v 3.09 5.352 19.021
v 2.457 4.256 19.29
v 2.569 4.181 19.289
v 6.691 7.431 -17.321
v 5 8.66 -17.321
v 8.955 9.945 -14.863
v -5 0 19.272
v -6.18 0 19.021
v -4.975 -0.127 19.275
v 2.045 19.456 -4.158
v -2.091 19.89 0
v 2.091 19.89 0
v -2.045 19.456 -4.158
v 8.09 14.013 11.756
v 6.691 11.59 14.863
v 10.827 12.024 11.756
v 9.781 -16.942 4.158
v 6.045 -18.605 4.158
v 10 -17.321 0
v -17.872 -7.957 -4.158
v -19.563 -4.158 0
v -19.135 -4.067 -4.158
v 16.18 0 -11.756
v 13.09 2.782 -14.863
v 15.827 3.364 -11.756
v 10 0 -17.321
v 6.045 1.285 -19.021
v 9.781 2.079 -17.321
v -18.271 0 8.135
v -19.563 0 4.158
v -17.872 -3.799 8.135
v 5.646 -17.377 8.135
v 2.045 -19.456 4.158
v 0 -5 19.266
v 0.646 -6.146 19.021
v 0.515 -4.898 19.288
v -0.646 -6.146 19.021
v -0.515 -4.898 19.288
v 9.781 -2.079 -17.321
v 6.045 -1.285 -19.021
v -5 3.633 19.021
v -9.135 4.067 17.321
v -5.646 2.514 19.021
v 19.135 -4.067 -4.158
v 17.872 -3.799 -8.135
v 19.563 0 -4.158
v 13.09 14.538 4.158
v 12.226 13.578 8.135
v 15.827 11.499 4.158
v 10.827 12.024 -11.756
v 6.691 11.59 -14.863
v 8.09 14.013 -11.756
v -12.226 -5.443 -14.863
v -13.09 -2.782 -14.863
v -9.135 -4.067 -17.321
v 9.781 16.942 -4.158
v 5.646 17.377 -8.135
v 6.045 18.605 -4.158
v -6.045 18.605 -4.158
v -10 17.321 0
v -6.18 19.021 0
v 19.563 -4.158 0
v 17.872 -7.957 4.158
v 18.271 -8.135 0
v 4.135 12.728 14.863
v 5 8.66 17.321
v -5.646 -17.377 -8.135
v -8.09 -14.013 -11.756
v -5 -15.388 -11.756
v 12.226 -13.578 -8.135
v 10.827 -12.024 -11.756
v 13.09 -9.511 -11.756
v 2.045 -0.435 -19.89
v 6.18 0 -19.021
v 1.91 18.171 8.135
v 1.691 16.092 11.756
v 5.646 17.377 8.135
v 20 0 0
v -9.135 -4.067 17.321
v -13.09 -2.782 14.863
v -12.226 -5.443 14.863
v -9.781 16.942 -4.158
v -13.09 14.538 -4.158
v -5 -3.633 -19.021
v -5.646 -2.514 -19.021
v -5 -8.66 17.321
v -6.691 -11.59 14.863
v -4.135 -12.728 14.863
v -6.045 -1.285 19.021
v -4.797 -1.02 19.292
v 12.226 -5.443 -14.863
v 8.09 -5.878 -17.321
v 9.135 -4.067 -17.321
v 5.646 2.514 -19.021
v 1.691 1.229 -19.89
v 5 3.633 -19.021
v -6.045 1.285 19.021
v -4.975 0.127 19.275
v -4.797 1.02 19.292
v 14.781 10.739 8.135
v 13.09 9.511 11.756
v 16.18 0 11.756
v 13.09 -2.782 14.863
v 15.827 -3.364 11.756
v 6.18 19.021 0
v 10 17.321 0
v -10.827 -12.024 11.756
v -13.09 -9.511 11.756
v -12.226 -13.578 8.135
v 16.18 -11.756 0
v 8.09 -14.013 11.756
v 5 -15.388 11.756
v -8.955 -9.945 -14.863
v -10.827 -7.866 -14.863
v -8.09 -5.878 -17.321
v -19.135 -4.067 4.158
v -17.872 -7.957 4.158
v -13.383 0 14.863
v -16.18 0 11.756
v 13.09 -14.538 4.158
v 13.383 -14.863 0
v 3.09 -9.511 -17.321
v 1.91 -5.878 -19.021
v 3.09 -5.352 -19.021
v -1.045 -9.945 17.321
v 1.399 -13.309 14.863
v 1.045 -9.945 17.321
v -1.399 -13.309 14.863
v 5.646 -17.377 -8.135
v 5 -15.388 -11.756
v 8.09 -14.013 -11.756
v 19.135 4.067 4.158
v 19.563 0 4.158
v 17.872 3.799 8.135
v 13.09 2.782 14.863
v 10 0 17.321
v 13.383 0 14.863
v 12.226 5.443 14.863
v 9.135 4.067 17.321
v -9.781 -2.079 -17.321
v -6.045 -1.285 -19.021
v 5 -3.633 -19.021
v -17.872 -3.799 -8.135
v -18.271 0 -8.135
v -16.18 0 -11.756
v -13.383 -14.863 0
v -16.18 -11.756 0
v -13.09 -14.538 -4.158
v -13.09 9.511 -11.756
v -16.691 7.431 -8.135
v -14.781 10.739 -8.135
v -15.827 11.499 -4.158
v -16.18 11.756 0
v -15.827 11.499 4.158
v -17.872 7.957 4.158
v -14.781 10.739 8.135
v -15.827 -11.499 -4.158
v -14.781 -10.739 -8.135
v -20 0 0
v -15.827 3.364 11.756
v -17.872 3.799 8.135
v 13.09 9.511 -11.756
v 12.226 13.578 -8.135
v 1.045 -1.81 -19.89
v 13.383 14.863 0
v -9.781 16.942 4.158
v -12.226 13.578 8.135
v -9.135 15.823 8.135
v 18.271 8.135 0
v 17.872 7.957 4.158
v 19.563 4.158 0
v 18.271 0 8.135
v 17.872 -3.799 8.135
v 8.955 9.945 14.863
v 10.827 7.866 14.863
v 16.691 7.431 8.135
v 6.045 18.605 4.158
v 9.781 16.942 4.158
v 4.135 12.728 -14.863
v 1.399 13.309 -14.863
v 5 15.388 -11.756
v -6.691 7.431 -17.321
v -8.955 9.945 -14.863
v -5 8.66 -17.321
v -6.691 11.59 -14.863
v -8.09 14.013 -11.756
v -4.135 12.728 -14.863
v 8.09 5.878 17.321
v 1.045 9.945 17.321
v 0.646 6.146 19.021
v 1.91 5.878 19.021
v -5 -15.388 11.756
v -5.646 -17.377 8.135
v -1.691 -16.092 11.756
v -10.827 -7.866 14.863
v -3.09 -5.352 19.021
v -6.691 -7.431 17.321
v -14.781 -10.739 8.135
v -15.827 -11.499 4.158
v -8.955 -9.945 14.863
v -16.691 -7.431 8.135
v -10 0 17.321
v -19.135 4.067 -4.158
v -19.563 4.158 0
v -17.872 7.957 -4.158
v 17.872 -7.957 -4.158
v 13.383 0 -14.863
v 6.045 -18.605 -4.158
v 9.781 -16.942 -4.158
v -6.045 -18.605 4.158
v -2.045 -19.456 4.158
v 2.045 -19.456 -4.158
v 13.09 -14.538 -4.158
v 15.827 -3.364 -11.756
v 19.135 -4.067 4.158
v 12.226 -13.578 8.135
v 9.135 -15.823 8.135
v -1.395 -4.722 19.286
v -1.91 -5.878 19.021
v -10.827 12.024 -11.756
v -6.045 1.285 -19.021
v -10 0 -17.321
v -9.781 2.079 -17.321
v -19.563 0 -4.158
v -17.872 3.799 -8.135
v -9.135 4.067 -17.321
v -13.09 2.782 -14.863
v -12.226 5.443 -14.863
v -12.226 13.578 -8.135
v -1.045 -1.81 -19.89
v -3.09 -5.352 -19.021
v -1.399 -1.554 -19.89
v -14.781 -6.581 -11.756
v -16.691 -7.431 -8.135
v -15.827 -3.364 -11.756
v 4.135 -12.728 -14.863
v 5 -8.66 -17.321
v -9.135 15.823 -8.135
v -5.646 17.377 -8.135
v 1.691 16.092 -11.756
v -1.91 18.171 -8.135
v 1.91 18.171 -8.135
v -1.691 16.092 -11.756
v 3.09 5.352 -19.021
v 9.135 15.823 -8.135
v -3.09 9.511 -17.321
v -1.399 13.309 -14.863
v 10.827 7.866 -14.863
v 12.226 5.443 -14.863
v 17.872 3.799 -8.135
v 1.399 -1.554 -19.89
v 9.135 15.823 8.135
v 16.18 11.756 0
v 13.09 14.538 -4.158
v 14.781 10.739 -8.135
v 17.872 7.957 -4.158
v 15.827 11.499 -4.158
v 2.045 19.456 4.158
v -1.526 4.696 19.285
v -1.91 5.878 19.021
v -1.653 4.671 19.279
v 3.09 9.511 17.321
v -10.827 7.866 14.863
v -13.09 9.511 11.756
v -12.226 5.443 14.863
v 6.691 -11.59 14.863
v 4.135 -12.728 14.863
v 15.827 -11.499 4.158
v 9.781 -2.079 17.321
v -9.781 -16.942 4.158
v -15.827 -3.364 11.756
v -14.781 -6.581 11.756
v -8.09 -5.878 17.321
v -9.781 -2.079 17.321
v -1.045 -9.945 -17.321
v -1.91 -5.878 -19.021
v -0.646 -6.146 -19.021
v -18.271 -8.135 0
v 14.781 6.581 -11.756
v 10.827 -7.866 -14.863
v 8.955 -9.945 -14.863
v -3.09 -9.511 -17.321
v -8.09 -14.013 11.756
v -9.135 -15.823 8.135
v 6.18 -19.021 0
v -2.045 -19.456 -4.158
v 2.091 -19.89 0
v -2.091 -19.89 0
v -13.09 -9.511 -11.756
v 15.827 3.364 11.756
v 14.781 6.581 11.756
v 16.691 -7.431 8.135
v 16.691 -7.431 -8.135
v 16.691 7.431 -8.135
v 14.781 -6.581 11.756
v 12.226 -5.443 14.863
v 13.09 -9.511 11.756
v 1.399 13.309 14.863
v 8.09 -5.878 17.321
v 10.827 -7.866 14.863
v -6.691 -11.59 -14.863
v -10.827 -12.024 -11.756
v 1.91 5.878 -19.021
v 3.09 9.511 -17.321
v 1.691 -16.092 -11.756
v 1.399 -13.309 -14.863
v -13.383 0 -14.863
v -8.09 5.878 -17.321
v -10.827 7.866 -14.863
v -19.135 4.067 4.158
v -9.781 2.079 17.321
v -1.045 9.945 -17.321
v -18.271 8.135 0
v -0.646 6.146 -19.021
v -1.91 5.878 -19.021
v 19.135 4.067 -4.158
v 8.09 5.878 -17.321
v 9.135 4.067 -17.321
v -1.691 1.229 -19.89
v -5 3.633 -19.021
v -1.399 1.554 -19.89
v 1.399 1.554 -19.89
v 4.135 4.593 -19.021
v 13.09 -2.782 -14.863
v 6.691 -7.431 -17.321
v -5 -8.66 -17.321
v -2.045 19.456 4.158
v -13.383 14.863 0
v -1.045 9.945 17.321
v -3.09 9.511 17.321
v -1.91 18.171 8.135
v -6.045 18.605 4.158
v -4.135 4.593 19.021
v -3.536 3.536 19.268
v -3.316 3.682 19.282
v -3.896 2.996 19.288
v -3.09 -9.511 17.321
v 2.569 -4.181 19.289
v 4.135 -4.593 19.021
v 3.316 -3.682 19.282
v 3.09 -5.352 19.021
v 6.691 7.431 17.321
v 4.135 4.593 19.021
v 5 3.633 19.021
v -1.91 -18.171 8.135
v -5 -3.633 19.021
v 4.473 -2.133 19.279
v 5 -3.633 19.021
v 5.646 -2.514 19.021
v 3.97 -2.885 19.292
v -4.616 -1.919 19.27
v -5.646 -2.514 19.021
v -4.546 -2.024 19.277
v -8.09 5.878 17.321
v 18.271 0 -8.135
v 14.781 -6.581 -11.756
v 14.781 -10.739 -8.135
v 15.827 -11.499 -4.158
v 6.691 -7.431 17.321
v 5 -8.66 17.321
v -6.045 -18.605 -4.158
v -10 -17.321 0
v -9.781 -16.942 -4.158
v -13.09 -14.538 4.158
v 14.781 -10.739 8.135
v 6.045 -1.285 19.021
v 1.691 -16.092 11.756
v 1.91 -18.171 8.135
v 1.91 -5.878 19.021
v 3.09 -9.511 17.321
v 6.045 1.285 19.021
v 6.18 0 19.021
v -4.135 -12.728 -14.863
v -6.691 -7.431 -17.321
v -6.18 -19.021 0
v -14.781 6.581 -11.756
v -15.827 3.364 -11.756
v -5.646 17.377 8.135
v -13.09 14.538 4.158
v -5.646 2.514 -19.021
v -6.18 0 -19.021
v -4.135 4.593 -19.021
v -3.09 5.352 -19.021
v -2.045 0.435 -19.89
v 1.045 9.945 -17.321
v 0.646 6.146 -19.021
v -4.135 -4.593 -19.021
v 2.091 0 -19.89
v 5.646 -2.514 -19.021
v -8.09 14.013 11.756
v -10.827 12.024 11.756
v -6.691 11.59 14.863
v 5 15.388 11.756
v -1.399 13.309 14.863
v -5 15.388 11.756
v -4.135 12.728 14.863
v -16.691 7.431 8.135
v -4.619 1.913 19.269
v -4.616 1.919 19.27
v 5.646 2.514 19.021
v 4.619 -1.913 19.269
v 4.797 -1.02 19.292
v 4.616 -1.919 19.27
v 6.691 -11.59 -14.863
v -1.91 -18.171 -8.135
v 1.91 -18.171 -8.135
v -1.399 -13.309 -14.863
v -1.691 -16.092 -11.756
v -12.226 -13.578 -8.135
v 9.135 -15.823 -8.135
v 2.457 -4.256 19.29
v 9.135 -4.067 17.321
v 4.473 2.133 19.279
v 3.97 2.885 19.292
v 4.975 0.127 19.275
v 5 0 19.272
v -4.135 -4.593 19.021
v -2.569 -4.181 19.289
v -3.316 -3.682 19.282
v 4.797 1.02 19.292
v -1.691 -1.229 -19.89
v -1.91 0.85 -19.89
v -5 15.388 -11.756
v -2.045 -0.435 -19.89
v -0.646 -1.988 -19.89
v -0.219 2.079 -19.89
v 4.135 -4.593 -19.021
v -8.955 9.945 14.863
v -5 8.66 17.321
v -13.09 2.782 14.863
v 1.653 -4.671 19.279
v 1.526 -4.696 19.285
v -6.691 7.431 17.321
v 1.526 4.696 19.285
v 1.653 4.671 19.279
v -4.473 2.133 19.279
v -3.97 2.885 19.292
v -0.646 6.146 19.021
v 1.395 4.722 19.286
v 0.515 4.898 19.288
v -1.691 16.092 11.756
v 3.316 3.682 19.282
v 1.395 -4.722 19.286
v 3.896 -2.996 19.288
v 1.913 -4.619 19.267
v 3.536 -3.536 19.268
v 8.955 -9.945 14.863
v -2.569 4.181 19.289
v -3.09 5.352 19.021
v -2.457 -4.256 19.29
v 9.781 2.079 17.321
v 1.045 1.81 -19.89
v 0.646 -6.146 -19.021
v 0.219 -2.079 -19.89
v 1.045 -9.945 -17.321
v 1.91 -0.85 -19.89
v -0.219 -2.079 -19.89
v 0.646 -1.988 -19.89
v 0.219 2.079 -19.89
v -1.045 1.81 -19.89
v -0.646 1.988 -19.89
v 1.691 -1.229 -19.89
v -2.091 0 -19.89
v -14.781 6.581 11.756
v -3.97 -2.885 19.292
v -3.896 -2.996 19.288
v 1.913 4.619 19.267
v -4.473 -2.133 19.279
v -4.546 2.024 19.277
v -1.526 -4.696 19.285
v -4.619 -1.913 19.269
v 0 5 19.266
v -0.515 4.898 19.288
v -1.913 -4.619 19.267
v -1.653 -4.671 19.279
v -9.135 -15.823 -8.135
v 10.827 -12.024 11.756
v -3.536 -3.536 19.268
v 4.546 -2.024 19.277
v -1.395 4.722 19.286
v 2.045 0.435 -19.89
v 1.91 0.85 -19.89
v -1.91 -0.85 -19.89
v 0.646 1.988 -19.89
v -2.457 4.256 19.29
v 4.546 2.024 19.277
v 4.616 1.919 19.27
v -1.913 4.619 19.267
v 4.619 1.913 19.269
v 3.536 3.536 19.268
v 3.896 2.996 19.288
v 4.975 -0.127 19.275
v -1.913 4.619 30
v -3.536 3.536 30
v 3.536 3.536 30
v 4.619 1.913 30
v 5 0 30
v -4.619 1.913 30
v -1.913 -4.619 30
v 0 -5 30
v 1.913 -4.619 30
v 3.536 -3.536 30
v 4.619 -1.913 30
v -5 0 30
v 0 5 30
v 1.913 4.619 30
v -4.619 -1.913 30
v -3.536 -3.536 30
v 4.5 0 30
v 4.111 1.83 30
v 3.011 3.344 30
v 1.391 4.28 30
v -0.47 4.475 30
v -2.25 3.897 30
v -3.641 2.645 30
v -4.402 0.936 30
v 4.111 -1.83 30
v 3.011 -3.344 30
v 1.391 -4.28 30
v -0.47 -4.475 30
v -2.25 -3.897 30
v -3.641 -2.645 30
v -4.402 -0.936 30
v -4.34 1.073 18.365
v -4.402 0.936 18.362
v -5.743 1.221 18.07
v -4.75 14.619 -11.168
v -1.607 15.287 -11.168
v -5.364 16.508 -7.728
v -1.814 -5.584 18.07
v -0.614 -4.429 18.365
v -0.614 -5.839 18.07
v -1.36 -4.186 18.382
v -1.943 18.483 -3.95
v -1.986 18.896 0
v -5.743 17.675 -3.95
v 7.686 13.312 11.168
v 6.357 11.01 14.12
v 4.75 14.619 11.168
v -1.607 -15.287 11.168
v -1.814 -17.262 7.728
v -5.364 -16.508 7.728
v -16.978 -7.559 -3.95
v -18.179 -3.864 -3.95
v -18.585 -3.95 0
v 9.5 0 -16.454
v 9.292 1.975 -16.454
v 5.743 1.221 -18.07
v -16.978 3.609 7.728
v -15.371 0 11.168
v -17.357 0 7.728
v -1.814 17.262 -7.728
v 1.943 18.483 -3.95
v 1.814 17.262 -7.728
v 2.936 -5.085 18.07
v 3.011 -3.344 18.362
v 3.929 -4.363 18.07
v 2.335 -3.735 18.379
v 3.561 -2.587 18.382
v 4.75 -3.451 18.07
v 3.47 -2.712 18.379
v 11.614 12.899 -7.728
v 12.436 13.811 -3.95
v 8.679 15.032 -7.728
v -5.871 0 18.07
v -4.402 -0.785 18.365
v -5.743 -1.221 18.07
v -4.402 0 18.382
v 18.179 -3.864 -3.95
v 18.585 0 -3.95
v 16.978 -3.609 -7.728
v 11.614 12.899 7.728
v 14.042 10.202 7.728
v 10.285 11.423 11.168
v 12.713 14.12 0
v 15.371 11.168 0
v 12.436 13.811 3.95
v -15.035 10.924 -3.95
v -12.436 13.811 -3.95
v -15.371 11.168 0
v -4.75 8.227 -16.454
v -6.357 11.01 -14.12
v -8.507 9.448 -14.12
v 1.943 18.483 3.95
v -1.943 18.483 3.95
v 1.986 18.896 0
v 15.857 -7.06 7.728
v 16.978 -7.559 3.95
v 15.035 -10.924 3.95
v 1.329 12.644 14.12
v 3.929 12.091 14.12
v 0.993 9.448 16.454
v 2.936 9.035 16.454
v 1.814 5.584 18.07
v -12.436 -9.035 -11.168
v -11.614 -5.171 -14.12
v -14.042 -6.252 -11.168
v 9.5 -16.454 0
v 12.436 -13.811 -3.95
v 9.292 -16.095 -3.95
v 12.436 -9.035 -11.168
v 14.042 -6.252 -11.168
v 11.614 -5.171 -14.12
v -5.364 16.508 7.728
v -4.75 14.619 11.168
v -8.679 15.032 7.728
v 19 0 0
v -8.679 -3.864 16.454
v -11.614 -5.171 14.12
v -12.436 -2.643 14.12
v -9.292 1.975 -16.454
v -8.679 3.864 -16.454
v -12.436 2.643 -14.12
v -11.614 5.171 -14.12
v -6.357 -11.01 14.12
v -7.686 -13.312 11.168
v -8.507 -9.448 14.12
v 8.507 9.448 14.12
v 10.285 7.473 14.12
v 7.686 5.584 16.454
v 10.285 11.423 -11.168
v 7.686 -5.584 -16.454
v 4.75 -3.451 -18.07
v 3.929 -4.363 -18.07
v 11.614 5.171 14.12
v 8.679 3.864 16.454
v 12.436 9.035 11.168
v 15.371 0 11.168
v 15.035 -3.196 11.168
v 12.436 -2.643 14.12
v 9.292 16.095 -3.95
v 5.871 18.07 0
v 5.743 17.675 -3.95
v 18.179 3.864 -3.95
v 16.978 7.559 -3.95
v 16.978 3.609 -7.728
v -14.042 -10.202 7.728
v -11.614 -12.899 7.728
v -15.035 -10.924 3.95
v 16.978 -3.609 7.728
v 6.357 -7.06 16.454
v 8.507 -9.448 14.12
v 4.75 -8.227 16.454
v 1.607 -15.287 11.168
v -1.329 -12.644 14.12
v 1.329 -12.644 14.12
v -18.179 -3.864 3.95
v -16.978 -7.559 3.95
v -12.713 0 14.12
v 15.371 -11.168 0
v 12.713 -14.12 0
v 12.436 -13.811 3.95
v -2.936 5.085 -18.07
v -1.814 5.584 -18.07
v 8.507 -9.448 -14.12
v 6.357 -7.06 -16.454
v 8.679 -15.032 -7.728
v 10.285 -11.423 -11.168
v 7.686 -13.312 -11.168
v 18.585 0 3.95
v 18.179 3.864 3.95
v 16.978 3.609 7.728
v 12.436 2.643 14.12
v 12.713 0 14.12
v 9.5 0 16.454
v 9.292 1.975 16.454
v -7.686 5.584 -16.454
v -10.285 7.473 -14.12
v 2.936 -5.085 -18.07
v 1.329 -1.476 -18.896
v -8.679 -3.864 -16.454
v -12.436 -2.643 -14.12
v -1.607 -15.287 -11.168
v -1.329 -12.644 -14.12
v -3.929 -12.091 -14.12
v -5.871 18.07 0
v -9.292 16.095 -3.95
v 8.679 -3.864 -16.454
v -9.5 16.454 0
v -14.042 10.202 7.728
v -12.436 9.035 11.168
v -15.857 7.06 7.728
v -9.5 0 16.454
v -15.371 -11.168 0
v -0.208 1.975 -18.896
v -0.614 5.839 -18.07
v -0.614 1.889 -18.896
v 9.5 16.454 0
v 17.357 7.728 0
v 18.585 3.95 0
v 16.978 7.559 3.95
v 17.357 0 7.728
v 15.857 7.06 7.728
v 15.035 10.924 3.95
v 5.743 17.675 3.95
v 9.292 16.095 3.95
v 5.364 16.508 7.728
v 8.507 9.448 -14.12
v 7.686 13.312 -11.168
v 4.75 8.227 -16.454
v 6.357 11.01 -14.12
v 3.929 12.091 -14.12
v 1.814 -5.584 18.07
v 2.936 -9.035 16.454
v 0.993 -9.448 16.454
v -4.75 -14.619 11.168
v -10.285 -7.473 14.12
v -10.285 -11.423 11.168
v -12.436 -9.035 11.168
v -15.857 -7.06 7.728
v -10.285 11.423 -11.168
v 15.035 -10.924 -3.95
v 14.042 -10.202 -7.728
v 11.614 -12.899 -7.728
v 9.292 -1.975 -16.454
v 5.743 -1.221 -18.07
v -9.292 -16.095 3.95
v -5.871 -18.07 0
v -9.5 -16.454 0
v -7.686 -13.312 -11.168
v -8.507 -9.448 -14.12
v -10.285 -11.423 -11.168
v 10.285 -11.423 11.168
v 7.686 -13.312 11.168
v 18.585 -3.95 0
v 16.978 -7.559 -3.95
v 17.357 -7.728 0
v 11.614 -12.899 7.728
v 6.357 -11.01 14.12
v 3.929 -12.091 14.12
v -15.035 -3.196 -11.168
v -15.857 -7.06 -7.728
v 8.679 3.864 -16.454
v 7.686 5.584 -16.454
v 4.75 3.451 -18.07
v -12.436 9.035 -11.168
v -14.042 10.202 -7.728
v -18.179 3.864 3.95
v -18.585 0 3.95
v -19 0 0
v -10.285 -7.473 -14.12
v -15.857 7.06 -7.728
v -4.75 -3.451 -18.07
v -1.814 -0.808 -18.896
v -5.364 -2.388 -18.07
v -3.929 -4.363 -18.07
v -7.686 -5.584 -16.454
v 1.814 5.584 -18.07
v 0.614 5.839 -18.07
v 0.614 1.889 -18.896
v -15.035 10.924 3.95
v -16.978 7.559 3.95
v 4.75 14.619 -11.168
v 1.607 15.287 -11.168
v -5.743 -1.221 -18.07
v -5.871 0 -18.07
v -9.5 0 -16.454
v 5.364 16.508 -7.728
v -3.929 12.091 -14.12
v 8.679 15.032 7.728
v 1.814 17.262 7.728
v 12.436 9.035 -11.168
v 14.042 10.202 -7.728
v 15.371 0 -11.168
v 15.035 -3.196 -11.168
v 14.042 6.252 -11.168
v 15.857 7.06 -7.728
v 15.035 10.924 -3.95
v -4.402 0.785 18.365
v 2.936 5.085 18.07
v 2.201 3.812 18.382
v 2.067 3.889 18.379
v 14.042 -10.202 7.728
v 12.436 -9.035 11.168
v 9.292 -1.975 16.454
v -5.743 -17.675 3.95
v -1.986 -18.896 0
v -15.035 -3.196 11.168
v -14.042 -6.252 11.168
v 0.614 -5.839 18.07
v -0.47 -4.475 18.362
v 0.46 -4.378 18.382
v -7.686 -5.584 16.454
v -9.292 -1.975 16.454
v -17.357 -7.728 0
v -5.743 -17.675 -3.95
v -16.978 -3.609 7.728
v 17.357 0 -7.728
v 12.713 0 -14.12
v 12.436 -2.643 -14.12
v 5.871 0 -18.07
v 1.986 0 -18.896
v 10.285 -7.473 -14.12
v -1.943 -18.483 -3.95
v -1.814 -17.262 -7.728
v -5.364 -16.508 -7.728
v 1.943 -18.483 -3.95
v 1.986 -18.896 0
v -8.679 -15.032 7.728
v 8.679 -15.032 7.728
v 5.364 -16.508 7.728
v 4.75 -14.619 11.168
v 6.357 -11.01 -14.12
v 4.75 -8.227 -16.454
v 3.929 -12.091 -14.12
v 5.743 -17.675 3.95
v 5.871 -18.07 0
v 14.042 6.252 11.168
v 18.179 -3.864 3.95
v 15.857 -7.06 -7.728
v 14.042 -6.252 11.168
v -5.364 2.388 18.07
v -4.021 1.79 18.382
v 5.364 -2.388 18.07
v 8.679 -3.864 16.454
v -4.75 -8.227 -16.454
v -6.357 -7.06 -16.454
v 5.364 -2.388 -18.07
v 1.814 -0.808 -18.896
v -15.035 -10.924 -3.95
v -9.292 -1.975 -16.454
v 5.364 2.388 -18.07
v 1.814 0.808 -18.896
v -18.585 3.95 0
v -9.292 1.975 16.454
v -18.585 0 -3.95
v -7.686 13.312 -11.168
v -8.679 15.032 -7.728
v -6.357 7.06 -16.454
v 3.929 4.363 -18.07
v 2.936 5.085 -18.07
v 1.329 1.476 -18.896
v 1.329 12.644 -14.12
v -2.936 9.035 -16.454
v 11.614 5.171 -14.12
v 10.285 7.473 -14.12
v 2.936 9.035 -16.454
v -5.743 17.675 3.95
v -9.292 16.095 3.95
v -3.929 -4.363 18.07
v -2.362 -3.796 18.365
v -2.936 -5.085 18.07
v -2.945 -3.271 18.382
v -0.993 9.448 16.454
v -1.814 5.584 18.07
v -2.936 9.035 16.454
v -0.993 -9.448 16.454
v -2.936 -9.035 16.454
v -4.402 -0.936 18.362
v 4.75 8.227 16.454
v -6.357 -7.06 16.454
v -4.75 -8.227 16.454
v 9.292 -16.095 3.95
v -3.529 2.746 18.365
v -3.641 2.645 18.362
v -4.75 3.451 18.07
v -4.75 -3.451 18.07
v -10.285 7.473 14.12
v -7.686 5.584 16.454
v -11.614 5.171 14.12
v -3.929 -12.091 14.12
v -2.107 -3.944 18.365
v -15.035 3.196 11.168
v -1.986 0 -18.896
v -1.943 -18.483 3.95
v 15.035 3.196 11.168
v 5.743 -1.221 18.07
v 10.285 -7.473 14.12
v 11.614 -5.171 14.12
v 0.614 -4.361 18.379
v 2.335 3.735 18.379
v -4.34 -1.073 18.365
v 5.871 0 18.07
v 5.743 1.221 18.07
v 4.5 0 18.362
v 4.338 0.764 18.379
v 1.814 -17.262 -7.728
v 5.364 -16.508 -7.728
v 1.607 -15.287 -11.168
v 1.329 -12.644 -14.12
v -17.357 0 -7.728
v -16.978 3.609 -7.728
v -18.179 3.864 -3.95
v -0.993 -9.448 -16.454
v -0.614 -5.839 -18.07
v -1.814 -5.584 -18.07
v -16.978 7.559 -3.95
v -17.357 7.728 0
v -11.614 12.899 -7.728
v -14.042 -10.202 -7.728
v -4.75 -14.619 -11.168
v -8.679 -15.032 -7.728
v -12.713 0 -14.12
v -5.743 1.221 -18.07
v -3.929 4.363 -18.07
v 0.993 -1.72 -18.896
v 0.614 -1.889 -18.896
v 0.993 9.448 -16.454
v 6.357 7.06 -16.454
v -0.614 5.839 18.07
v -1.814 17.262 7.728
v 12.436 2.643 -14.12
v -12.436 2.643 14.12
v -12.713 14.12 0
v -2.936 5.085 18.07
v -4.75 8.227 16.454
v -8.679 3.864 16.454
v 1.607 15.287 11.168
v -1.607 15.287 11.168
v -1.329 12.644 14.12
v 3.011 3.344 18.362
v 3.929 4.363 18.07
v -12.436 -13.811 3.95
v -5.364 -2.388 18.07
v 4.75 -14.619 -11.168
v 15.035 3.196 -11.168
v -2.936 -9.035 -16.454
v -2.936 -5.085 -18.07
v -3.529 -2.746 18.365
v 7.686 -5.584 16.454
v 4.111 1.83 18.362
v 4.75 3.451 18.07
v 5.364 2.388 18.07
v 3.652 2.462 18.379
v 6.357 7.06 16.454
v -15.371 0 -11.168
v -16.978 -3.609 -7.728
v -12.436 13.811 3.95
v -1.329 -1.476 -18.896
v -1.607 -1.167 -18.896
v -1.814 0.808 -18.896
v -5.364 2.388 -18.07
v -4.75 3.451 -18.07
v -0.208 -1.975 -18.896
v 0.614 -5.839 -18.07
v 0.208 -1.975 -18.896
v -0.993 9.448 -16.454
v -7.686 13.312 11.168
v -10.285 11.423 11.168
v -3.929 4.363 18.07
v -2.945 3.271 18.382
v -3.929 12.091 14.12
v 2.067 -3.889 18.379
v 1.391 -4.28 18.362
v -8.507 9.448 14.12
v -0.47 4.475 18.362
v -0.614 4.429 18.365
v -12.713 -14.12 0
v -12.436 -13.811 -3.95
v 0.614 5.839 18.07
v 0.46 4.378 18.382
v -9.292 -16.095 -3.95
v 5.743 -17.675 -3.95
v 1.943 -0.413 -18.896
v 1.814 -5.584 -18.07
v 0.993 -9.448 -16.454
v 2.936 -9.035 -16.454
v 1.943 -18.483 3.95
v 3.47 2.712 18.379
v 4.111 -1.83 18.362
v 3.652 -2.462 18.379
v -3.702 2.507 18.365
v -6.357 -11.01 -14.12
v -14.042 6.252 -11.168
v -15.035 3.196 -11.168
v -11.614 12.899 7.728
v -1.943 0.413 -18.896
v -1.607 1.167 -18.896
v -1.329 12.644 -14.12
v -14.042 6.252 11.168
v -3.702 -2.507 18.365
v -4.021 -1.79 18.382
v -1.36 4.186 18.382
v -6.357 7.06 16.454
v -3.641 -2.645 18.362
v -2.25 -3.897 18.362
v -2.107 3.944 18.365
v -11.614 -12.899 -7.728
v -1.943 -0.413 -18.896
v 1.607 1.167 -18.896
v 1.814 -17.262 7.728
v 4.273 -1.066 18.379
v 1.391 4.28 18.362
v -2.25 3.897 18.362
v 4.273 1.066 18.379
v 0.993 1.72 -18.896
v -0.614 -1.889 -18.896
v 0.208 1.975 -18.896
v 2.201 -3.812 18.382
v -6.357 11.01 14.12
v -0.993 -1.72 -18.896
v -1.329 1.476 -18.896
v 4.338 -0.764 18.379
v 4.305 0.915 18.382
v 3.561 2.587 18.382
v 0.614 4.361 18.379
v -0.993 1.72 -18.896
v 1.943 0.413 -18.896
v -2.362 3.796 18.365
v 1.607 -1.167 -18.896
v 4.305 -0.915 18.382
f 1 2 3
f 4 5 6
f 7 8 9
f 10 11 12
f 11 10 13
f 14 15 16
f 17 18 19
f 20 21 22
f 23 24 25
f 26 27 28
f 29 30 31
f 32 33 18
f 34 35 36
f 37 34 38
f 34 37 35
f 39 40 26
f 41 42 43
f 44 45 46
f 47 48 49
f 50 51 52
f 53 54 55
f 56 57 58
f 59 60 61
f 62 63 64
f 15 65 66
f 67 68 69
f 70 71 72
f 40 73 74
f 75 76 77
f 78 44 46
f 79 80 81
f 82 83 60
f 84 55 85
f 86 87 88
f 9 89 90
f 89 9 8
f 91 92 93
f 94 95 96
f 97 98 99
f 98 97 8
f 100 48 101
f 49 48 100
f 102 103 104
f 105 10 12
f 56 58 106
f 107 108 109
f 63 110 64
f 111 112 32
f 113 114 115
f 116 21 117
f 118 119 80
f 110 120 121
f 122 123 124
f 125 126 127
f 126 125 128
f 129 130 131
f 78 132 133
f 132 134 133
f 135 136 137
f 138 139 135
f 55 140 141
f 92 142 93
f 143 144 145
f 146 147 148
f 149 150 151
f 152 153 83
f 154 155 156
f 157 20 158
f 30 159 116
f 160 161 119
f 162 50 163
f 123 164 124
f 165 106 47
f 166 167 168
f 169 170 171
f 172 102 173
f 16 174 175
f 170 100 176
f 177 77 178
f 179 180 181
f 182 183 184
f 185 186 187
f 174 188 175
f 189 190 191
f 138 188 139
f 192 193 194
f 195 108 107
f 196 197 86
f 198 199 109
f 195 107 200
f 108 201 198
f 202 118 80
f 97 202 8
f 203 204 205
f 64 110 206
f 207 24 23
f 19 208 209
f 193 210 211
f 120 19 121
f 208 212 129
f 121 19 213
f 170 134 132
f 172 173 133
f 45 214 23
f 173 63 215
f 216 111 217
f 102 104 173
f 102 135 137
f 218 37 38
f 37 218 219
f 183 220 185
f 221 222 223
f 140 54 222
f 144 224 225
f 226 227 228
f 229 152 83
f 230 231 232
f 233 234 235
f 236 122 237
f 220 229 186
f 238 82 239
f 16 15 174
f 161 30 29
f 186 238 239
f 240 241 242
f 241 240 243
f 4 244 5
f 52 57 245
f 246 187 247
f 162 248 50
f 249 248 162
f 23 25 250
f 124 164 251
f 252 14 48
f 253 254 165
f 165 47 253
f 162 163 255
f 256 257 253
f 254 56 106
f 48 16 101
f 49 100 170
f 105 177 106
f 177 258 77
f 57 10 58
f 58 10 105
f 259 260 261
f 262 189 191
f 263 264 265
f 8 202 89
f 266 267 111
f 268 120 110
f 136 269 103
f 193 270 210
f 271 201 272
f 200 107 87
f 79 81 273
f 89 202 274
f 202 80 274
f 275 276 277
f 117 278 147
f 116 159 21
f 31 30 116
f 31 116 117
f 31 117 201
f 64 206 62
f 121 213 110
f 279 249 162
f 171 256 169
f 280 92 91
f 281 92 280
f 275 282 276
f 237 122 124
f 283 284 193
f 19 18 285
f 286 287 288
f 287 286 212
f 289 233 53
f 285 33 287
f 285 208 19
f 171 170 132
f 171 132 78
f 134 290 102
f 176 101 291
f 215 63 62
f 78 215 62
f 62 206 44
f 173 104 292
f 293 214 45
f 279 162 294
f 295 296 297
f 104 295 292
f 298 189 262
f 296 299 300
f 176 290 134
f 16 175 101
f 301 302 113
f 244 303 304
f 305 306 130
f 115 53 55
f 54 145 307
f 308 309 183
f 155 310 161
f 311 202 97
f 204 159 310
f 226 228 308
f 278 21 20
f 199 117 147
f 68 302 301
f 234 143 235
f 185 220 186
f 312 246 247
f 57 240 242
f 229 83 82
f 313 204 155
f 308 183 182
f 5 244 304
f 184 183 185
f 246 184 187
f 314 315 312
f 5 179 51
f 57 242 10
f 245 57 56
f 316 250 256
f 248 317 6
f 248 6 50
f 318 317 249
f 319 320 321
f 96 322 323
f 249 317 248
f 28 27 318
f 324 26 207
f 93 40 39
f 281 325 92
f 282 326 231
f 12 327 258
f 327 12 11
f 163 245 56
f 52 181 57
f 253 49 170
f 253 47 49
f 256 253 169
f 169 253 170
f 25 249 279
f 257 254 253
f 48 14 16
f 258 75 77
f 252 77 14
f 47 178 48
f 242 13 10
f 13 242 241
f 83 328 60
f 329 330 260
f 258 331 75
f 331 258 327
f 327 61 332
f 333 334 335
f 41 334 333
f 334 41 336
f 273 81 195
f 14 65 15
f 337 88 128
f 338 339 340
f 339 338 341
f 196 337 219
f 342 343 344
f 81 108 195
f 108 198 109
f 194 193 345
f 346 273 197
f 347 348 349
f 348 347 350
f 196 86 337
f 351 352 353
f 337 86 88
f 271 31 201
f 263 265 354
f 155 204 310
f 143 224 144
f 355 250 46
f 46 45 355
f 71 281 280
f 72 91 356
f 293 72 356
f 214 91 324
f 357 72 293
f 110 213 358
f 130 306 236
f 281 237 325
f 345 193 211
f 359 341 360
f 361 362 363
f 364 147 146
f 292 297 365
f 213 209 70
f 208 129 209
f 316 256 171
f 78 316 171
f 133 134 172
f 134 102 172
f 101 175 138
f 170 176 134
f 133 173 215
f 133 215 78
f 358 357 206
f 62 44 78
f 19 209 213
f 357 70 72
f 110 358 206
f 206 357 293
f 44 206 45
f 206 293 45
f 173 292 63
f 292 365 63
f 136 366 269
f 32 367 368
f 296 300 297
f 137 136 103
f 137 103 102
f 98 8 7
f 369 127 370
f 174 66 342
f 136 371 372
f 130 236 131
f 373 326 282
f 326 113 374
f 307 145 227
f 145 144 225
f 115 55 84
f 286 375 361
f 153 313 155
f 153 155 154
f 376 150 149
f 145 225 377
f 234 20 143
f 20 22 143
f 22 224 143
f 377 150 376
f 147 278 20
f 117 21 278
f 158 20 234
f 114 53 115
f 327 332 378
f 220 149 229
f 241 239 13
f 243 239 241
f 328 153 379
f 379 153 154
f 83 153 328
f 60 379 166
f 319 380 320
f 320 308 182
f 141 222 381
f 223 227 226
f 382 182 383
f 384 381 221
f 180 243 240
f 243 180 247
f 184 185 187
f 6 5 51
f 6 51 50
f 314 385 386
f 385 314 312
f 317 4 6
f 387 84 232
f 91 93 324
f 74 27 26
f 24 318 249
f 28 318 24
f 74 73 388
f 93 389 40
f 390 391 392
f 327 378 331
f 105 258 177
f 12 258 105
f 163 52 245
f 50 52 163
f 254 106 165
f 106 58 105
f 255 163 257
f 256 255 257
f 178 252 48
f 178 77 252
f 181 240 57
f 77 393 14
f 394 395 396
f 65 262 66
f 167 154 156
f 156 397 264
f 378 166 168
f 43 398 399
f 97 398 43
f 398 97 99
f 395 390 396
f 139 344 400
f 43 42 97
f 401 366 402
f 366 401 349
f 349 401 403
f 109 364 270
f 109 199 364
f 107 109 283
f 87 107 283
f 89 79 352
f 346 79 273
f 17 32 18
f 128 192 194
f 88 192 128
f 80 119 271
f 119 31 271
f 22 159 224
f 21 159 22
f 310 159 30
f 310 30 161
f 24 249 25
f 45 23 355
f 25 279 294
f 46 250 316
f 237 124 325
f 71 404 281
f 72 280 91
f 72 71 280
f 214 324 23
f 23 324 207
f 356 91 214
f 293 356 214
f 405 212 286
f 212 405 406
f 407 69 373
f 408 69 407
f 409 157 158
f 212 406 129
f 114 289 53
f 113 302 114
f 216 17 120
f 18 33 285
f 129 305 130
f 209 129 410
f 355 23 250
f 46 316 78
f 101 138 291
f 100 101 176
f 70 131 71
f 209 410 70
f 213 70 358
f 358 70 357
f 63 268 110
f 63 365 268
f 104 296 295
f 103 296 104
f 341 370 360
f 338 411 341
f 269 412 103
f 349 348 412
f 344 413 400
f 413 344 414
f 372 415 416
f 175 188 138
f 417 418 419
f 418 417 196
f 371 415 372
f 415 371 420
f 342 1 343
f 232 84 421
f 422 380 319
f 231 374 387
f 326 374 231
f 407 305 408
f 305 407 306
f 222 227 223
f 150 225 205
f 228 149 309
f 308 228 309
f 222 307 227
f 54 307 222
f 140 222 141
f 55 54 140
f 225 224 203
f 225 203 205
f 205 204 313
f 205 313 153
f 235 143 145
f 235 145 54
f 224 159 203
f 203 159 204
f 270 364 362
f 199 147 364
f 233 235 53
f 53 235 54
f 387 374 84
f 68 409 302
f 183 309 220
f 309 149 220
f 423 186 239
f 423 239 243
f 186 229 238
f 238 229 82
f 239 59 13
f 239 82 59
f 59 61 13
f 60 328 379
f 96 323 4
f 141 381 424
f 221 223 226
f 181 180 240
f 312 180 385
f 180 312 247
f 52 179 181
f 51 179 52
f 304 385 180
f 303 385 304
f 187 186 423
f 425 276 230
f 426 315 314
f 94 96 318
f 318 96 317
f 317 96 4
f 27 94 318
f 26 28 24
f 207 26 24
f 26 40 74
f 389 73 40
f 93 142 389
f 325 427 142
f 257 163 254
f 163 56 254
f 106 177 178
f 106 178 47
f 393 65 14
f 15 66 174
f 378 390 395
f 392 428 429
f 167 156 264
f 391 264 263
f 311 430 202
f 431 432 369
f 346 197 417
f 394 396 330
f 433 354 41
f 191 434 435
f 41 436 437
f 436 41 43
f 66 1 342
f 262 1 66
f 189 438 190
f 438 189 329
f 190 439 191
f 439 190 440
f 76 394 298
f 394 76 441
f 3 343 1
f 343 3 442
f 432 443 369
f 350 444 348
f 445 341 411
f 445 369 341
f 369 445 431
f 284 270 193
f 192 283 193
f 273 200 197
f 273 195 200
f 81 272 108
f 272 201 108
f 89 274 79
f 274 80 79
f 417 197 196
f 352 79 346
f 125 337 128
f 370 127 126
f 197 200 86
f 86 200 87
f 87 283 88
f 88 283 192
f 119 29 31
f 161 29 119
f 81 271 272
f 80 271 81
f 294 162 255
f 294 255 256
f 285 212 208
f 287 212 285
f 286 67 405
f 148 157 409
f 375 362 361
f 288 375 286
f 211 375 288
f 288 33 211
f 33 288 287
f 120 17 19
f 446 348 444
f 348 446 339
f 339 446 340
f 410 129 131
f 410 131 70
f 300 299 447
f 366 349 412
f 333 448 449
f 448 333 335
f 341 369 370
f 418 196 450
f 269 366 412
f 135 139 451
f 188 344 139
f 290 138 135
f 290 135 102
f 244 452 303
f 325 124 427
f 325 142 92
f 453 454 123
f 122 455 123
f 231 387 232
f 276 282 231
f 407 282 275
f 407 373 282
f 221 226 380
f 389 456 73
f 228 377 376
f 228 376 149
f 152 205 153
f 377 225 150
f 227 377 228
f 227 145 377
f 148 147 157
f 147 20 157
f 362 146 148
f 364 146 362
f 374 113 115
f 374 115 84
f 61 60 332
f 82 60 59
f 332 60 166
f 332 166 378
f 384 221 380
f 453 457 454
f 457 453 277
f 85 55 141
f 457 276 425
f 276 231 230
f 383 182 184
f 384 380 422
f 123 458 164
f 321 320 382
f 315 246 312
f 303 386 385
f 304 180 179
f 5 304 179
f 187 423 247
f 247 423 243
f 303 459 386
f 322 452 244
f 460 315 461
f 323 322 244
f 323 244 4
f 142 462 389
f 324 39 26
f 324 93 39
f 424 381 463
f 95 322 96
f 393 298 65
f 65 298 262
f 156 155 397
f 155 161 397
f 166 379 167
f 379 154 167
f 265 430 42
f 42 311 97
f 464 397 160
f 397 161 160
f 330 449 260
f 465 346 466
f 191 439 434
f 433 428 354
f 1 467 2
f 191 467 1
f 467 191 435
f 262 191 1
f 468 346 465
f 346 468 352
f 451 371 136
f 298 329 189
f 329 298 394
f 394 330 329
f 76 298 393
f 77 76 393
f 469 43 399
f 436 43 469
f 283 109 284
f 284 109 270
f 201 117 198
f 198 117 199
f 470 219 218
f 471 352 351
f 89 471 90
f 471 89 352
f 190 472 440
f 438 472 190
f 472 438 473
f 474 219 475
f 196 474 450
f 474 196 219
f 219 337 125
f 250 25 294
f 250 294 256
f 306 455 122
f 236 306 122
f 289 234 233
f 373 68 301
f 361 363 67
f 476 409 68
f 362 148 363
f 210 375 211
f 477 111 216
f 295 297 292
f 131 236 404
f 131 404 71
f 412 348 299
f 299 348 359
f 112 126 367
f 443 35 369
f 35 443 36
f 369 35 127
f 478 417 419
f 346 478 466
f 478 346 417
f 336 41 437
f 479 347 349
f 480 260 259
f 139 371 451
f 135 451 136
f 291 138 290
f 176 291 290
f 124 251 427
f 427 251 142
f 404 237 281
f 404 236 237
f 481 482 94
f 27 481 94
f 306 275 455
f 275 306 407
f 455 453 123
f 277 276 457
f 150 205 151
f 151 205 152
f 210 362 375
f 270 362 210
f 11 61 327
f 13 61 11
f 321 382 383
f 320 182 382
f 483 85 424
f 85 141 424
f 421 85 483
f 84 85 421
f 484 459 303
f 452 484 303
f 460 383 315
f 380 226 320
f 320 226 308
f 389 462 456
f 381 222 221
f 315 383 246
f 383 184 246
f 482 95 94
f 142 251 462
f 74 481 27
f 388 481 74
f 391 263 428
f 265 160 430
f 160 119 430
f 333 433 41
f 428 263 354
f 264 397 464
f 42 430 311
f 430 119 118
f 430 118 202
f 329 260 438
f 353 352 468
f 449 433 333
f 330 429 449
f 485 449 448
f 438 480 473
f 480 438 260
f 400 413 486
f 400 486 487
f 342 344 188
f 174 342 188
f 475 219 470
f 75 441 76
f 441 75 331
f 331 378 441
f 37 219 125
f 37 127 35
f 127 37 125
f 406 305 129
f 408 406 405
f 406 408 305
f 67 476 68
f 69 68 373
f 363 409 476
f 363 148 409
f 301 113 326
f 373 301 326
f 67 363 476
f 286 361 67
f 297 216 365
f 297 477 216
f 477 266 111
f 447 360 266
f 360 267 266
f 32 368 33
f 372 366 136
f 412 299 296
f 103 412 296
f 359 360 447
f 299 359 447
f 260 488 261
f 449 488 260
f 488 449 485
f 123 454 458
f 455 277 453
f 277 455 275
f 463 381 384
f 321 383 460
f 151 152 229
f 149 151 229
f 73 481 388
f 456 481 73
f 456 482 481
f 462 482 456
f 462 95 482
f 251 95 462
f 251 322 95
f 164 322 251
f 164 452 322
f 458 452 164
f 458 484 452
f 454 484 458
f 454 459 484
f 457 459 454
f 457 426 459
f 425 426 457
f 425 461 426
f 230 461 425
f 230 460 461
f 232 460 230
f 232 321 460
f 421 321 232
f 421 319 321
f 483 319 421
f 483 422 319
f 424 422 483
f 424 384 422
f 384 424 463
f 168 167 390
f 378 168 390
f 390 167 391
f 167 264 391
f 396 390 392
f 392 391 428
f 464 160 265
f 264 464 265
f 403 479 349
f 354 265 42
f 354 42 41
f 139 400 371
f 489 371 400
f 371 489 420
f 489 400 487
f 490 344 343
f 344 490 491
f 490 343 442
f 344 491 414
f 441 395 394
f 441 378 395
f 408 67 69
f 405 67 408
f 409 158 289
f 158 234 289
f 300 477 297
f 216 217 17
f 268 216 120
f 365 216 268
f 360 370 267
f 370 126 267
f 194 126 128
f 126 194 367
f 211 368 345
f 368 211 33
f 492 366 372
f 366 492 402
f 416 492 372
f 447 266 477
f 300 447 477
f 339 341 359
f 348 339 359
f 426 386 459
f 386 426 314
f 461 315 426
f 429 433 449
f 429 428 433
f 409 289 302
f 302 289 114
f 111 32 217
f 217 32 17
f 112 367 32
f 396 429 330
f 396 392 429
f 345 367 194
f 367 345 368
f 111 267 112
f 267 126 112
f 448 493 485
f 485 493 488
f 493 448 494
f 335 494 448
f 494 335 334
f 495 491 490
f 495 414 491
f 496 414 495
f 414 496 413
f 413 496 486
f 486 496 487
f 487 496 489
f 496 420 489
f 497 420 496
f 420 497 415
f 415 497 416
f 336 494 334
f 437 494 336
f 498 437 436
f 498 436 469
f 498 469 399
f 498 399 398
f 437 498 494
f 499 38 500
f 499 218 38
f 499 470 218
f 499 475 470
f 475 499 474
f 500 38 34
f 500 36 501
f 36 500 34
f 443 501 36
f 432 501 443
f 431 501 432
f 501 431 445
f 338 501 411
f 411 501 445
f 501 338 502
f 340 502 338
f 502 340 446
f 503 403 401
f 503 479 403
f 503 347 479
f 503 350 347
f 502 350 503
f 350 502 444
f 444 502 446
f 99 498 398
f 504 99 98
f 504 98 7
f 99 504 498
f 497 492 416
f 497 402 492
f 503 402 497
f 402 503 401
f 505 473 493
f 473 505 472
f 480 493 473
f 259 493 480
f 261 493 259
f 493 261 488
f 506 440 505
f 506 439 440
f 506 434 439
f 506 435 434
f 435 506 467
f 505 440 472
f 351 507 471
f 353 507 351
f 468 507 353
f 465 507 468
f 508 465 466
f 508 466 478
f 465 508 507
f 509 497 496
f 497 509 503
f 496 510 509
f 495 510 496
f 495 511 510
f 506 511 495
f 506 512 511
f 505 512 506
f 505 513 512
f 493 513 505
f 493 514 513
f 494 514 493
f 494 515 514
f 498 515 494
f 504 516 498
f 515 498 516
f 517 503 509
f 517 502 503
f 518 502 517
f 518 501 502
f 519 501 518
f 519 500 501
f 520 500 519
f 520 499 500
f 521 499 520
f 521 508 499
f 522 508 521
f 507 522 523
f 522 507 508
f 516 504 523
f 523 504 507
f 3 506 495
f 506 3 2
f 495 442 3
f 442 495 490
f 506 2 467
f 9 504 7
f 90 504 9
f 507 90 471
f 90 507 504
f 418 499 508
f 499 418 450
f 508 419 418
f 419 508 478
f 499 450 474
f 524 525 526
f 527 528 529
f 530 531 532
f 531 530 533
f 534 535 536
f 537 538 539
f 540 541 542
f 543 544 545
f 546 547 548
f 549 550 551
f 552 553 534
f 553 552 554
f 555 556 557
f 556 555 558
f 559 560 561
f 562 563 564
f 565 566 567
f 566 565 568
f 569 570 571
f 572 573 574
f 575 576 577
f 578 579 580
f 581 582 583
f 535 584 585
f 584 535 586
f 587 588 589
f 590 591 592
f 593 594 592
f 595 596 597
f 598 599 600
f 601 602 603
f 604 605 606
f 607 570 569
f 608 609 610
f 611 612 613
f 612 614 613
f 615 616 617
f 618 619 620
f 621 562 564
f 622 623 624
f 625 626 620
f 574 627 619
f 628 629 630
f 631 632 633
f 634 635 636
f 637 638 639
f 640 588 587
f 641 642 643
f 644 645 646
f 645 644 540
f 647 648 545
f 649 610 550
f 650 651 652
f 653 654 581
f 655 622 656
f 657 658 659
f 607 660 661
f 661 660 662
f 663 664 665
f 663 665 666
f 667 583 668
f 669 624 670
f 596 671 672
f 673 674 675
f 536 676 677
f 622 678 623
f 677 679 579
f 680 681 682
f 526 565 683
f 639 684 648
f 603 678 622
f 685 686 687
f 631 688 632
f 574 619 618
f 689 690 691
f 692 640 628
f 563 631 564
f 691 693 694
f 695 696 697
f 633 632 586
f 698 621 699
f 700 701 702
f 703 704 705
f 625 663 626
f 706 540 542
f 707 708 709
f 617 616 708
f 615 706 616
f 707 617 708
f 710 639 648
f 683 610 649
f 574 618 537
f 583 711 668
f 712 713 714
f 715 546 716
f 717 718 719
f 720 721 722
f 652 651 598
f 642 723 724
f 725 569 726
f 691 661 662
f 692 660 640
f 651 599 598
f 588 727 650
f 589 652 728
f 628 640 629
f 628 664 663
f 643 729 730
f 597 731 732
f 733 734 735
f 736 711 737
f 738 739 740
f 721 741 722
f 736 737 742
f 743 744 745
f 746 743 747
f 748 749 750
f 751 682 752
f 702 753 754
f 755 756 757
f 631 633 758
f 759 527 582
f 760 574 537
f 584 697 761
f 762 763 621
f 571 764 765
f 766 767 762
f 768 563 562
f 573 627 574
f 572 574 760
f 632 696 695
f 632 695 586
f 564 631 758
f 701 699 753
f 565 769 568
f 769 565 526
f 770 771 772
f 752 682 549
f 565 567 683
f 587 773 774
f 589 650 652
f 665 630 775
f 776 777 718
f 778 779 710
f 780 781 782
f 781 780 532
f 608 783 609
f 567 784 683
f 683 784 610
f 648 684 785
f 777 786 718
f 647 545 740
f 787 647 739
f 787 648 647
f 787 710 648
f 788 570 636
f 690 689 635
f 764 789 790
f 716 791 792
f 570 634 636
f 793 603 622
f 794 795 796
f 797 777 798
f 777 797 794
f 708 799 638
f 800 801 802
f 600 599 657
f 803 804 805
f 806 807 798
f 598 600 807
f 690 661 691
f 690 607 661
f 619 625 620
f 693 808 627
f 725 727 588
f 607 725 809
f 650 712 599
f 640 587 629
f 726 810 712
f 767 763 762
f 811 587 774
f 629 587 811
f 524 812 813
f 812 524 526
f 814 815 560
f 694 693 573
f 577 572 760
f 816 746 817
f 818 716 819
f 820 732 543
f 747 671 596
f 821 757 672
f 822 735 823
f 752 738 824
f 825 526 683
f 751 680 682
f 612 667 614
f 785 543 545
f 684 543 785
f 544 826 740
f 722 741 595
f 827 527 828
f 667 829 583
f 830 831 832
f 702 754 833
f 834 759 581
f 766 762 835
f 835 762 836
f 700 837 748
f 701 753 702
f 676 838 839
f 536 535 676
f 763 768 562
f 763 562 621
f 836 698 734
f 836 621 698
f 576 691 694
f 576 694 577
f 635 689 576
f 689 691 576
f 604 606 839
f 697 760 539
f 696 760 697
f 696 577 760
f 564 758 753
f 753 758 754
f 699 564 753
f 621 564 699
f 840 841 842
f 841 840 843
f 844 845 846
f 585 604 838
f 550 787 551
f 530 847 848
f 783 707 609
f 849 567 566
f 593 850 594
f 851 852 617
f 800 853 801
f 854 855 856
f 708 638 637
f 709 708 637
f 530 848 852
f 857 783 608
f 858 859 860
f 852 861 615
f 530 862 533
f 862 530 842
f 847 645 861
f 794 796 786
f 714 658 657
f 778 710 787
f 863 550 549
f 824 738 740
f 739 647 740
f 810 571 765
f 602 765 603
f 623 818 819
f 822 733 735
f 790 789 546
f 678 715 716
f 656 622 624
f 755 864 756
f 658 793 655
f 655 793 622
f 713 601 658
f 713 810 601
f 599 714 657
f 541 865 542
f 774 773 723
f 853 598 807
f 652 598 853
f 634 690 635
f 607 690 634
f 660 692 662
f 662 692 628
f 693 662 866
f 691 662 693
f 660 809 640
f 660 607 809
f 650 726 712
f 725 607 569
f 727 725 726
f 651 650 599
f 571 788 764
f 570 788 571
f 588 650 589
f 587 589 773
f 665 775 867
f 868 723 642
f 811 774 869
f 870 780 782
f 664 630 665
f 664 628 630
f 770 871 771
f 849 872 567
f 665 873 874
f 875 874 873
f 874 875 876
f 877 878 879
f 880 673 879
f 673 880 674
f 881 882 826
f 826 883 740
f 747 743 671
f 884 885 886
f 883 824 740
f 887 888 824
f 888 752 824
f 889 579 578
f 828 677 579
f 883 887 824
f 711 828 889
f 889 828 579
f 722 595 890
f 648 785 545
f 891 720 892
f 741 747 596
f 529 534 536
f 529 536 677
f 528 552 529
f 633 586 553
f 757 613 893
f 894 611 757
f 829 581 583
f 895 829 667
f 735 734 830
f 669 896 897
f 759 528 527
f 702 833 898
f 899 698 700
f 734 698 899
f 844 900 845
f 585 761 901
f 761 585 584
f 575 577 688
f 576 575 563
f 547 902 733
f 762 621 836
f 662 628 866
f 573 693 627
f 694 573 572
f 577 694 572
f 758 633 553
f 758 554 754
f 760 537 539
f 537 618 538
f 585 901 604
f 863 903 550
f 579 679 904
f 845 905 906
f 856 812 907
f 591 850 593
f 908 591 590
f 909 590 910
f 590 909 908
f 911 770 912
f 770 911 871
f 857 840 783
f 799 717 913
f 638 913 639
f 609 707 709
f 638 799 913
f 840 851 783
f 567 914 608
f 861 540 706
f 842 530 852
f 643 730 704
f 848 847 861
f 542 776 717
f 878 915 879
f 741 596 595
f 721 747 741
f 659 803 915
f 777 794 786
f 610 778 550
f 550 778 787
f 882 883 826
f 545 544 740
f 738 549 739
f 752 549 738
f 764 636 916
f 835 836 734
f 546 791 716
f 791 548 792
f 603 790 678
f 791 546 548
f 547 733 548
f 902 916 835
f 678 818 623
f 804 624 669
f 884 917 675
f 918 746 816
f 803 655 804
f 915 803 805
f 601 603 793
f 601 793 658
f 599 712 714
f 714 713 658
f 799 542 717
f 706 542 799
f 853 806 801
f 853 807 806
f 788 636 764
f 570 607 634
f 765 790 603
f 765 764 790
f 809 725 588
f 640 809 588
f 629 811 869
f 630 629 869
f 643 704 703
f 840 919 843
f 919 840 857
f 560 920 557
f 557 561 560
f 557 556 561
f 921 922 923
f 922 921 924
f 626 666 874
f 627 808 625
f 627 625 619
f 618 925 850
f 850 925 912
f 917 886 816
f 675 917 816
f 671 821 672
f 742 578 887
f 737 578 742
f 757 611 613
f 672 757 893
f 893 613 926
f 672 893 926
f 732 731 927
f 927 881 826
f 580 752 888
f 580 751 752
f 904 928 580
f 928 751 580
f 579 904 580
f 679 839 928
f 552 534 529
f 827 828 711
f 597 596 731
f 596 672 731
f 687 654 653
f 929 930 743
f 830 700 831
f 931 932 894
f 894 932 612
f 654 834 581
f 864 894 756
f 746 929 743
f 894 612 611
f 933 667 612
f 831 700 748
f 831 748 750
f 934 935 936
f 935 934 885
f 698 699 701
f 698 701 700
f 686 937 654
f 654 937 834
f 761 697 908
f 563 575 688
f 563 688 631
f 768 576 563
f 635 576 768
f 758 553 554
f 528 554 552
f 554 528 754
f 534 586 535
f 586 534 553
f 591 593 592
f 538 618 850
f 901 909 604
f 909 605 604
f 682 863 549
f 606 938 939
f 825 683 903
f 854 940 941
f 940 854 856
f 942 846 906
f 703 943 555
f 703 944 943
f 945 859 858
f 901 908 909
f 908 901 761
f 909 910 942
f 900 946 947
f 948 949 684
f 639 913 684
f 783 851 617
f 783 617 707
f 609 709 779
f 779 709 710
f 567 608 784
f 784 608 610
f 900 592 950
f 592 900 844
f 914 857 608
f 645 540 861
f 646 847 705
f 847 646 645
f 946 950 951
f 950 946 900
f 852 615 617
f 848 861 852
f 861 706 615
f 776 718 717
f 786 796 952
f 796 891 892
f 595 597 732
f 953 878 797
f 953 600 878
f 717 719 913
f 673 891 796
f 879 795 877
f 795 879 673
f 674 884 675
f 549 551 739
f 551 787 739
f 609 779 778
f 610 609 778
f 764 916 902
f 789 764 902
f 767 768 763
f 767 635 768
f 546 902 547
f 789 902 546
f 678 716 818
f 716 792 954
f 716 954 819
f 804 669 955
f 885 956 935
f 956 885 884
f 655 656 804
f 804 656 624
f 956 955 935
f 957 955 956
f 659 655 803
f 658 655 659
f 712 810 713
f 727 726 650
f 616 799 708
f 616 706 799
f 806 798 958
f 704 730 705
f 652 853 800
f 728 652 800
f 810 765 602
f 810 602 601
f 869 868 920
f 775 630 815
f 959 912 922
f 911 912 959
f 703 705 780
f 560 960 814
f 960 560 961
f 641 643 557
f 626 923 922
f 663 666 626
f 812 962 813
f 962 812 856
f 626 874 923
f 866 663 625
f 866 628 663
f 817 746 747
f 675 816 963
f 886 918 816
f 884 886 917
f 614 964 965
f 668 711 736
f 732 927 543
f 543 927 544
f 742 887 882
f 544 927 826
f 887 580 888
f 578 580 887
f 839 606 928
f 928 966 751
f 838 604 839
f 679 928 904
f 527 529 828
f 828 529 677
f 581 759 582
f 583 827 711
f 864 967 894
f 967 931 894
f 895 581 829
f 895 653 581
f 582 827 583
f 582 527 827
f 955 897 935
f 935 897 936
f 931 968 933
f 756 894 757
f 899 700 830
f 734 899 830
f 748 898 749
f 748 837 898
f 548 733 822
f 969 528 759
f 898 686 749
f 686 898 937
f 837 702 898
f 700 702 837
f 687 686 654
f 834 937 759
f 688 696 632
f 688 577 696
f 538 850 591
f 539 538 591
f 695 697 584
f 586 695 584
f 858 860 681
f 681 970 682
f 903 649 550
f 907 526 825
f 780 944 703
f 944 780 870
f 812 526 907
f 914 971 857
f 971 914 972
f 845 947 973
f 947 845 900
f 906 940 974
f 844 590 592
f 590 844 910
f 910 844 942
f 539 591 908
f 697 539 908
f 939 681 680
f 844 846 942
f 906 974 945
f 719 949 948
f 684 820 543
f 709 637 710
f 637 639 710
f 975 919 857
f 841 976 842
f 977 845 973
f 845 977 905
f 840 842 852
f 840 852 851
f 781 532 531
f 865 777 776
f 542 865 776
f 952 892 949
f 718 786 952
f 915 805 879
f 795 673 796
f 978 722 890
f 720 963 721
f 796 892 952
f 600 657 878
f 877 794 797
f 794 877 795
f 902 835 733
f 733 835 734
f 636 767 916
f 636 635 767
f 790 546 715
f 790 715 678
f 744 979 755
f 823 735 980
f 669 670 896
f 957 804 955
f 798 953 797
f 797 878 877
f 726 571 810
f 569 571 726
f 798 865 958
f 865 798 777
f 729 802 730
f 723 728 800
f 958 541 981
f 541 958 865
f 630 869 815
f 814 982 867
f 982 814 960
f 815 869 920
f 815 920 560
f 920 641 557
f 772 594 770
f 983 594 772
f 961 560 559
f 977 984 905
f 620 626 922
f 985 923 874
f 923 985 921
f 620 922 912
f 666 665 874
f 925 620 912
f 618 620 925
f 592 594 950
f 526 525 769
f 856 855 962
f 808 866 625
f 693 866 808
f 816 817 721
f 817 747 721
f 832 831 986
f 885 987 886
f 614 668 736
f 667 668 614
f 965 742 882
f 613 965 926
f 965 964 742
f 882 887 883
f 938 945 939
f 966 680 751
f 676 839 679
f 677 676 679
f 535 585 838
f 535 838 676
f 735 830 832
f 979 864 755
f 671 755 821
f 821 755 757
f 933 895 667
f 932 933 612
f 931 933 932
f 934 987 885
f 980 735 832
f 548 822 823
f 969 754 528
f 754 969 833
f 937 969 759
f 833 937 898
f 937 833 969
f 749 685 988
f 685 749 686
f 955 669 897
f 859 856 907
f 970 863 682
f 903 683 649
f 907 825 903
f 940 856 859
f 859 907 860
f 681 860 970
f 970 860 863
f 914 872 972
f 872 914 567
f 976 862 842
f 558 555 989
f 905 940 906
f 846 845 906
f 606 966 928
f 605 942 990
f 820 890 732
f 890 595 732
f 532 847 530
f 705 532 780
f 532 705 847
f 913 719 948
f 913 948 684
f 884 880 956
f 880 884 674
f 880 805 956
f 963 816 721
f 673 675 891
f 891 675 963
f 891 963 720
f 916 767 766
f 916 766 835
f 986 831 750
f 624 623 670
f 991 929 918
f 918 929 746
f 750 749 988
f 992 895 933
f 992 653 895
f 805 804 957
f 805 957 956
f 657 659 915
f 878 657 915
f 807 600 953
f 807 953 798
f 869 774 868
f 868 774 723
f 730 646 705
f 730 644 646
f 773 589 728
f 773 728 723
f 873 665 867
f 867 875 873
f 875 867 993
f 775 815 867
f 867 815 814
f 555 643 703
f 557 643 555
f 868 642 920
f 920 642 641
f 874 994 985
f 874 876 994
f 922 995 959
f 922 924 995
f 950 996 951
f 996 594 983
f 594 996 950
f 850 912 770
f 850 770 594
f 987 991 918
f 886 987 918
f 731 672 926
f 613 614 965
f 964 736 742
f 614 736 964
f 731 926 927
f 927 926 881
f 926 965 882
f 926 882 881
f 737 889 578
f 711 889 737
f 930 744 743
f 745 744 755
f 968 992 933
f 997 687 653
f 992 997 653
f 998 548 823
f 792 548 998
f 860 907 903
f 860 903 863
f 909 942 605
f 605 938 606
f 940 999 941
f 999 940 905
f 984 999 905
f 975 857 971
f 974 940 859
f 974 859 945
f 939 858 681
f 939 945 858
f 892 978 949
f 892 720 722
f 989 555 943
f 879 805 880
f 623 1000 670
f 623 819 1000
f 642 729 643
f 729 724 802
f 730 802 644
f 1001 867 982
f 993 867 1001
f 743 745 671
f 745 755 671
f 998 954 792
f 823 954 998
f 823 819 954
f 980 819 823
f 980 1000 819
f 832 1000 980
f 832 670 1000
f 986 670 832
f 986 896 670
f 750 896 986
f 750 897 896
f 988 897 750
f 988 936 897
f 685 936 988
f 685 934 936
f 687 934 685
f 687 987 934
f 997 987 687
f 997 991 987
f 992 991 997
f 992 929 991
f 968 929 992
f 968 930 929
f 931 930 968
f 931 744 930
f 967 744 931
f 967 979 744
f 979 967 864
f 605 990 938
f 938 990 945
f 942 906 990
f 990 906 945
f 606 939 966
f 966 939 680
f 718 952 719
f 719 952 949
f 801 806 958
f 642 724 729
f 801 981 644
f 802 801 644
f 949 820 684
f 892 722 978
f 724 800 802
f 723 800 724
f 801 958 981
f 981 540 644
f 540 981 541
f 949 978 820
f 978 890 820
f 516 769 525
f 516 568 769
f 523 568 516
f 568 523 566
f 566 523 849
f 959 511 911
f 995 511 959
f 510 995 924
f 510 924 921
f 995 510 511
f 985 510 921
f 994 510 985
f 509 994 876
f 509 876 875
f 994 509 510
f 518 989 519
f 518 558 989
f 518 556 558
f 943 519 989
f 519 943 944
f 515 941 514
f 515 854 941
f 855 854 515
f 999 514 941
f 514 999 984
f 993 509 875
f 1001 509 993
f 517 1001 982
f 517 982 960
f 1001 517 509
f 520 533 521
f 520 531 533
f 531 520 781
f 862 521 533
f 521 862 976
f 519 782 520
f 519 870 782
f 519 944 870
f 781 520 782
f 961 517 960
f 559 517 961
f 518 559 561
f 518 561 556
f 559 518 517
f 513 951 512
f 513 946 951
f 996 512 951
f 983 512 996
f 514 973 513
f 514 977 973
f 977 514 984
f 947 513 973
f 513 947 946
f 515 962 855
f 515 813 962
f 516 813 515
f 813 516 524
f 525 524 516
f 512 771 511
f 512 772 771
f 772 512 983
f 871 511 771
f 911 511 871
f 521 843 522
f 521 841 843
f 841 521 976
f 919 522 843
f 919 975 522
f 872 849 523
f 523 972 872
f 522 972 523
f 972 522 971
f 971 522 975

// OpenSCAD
// Generated by SolidPython 1.1.3 on 2024-02-13 12:38:50


difference() {
	union() {
		sphere(r = 20);
		translate(v = [0, 0, 10]) {
			cylinder(d = 10, h = 20);
		}
	}
	union() {
		sphere(r = 19.0000000000);
		translate(v = [0, 0, 10]) {
			cylinder(d = 9.0000000000, h = 21.0000000000);
		}
	}
}
/***********************************************
*********      SolidPython code:      **********
************************************************
 
import math
from solid import *
from solid import scad_render_to_file, sphere, translate, cylinder
from solid.utils import *
from stl import mesh
import numpy as np
import subprocess
import pdb

def convert_scad_to_stl(scad_file, stl_file):
    try:
        # Command to convert SCAD to STL using OpenSCAD
        cmd = ['openscad', '-o', stl_file, scad_file]

        # Run the command
        subprocess.run(cmd, check=True)
        print(f"Successfully converted {scad_file} to {stl_file}")
    except subprocess.CalledProcessError as e:
        print(f"An error occurred while converting SCAD to STL: {e}")


# Function to calculate dimensions of a Helmholtz resonator
def calculate_resonator_dimensions(frequency):
    # These are placeholder values. You'll need to replace these with the actual calculations.
    radius = 10  # in mm
    neck_length = 20  # in mm
    neck_radius = 5  # in mm
    shell_thickness = 0.5

    return radius, neck_length, neck_radius, shell_thickness

# Function to create a 3D model of the resonator
def create_resonator_model(radius, neck_length, neck_radius, shell_thickness):
    sphere_diameter = radius * 2
    neck_diameter = neck_radius * 2

    sphere_model = sphere(sphere_diameter)
    neck_model = translate([0, 0, radius])(cylinder(h=neck_length, d=neck_diameter))

    # Combine the sphere and neck
    resonator_model = sphere_model + neck_model

    negative_sphere_model = sphere(sphere_diameter - (2 * shell_thickness)) 
    negative_neck_model = translate([0, 0, radius])(cylinder(h=neck_length + 2 * shell_thickness, d=neck_diameter - (2 * shell_thickness)))
    negative_model = negative_sphere_model + negative_neck_model

    return resonator_model - negative_model

# Function to save the model as an STL file
def save_stl(model, filename):
    model_mesh = mesh.Mesh(np.zeros(model.faces.shape[0], dtype=mesh.Mesh.dtype))
    for i, f in enumerate(model.faces):
        for j in range(3):
            model_mesh.vectors[i][j] = model.points[f[j],:]

    model_mesh.save(filename)

# Main execution
if __name__ == "__main__":
    target_frequency = 440  # A4 note, for example
    radius, neck_length, neck_radius, shell_thickness = calculate_resonator_dimensions(target_frequency)
    resonator_model = create_resonator_model(radius, neck_length, neck_radius, shell_thickness)
    scad_render_to_file(resonator_model, 'resonator.scad')
    pdb.set_trace()
    convert_scad_to_stl('resonator.scad', 'resonator.stl')


    # Convert SCAD to STL (you might need to do this step outside of Python using OpenSCAD software)
    # Alternatively, you can use a Python library that can directly convert OpenSCAD scripts to STL, if available.
    
    # Placeholder for STL conversion
    # save_stl(resonator_model, 'resonator.stl')

    print("Model generated. Check the 'resonator.stl' file.")
 
 
************************************************/
